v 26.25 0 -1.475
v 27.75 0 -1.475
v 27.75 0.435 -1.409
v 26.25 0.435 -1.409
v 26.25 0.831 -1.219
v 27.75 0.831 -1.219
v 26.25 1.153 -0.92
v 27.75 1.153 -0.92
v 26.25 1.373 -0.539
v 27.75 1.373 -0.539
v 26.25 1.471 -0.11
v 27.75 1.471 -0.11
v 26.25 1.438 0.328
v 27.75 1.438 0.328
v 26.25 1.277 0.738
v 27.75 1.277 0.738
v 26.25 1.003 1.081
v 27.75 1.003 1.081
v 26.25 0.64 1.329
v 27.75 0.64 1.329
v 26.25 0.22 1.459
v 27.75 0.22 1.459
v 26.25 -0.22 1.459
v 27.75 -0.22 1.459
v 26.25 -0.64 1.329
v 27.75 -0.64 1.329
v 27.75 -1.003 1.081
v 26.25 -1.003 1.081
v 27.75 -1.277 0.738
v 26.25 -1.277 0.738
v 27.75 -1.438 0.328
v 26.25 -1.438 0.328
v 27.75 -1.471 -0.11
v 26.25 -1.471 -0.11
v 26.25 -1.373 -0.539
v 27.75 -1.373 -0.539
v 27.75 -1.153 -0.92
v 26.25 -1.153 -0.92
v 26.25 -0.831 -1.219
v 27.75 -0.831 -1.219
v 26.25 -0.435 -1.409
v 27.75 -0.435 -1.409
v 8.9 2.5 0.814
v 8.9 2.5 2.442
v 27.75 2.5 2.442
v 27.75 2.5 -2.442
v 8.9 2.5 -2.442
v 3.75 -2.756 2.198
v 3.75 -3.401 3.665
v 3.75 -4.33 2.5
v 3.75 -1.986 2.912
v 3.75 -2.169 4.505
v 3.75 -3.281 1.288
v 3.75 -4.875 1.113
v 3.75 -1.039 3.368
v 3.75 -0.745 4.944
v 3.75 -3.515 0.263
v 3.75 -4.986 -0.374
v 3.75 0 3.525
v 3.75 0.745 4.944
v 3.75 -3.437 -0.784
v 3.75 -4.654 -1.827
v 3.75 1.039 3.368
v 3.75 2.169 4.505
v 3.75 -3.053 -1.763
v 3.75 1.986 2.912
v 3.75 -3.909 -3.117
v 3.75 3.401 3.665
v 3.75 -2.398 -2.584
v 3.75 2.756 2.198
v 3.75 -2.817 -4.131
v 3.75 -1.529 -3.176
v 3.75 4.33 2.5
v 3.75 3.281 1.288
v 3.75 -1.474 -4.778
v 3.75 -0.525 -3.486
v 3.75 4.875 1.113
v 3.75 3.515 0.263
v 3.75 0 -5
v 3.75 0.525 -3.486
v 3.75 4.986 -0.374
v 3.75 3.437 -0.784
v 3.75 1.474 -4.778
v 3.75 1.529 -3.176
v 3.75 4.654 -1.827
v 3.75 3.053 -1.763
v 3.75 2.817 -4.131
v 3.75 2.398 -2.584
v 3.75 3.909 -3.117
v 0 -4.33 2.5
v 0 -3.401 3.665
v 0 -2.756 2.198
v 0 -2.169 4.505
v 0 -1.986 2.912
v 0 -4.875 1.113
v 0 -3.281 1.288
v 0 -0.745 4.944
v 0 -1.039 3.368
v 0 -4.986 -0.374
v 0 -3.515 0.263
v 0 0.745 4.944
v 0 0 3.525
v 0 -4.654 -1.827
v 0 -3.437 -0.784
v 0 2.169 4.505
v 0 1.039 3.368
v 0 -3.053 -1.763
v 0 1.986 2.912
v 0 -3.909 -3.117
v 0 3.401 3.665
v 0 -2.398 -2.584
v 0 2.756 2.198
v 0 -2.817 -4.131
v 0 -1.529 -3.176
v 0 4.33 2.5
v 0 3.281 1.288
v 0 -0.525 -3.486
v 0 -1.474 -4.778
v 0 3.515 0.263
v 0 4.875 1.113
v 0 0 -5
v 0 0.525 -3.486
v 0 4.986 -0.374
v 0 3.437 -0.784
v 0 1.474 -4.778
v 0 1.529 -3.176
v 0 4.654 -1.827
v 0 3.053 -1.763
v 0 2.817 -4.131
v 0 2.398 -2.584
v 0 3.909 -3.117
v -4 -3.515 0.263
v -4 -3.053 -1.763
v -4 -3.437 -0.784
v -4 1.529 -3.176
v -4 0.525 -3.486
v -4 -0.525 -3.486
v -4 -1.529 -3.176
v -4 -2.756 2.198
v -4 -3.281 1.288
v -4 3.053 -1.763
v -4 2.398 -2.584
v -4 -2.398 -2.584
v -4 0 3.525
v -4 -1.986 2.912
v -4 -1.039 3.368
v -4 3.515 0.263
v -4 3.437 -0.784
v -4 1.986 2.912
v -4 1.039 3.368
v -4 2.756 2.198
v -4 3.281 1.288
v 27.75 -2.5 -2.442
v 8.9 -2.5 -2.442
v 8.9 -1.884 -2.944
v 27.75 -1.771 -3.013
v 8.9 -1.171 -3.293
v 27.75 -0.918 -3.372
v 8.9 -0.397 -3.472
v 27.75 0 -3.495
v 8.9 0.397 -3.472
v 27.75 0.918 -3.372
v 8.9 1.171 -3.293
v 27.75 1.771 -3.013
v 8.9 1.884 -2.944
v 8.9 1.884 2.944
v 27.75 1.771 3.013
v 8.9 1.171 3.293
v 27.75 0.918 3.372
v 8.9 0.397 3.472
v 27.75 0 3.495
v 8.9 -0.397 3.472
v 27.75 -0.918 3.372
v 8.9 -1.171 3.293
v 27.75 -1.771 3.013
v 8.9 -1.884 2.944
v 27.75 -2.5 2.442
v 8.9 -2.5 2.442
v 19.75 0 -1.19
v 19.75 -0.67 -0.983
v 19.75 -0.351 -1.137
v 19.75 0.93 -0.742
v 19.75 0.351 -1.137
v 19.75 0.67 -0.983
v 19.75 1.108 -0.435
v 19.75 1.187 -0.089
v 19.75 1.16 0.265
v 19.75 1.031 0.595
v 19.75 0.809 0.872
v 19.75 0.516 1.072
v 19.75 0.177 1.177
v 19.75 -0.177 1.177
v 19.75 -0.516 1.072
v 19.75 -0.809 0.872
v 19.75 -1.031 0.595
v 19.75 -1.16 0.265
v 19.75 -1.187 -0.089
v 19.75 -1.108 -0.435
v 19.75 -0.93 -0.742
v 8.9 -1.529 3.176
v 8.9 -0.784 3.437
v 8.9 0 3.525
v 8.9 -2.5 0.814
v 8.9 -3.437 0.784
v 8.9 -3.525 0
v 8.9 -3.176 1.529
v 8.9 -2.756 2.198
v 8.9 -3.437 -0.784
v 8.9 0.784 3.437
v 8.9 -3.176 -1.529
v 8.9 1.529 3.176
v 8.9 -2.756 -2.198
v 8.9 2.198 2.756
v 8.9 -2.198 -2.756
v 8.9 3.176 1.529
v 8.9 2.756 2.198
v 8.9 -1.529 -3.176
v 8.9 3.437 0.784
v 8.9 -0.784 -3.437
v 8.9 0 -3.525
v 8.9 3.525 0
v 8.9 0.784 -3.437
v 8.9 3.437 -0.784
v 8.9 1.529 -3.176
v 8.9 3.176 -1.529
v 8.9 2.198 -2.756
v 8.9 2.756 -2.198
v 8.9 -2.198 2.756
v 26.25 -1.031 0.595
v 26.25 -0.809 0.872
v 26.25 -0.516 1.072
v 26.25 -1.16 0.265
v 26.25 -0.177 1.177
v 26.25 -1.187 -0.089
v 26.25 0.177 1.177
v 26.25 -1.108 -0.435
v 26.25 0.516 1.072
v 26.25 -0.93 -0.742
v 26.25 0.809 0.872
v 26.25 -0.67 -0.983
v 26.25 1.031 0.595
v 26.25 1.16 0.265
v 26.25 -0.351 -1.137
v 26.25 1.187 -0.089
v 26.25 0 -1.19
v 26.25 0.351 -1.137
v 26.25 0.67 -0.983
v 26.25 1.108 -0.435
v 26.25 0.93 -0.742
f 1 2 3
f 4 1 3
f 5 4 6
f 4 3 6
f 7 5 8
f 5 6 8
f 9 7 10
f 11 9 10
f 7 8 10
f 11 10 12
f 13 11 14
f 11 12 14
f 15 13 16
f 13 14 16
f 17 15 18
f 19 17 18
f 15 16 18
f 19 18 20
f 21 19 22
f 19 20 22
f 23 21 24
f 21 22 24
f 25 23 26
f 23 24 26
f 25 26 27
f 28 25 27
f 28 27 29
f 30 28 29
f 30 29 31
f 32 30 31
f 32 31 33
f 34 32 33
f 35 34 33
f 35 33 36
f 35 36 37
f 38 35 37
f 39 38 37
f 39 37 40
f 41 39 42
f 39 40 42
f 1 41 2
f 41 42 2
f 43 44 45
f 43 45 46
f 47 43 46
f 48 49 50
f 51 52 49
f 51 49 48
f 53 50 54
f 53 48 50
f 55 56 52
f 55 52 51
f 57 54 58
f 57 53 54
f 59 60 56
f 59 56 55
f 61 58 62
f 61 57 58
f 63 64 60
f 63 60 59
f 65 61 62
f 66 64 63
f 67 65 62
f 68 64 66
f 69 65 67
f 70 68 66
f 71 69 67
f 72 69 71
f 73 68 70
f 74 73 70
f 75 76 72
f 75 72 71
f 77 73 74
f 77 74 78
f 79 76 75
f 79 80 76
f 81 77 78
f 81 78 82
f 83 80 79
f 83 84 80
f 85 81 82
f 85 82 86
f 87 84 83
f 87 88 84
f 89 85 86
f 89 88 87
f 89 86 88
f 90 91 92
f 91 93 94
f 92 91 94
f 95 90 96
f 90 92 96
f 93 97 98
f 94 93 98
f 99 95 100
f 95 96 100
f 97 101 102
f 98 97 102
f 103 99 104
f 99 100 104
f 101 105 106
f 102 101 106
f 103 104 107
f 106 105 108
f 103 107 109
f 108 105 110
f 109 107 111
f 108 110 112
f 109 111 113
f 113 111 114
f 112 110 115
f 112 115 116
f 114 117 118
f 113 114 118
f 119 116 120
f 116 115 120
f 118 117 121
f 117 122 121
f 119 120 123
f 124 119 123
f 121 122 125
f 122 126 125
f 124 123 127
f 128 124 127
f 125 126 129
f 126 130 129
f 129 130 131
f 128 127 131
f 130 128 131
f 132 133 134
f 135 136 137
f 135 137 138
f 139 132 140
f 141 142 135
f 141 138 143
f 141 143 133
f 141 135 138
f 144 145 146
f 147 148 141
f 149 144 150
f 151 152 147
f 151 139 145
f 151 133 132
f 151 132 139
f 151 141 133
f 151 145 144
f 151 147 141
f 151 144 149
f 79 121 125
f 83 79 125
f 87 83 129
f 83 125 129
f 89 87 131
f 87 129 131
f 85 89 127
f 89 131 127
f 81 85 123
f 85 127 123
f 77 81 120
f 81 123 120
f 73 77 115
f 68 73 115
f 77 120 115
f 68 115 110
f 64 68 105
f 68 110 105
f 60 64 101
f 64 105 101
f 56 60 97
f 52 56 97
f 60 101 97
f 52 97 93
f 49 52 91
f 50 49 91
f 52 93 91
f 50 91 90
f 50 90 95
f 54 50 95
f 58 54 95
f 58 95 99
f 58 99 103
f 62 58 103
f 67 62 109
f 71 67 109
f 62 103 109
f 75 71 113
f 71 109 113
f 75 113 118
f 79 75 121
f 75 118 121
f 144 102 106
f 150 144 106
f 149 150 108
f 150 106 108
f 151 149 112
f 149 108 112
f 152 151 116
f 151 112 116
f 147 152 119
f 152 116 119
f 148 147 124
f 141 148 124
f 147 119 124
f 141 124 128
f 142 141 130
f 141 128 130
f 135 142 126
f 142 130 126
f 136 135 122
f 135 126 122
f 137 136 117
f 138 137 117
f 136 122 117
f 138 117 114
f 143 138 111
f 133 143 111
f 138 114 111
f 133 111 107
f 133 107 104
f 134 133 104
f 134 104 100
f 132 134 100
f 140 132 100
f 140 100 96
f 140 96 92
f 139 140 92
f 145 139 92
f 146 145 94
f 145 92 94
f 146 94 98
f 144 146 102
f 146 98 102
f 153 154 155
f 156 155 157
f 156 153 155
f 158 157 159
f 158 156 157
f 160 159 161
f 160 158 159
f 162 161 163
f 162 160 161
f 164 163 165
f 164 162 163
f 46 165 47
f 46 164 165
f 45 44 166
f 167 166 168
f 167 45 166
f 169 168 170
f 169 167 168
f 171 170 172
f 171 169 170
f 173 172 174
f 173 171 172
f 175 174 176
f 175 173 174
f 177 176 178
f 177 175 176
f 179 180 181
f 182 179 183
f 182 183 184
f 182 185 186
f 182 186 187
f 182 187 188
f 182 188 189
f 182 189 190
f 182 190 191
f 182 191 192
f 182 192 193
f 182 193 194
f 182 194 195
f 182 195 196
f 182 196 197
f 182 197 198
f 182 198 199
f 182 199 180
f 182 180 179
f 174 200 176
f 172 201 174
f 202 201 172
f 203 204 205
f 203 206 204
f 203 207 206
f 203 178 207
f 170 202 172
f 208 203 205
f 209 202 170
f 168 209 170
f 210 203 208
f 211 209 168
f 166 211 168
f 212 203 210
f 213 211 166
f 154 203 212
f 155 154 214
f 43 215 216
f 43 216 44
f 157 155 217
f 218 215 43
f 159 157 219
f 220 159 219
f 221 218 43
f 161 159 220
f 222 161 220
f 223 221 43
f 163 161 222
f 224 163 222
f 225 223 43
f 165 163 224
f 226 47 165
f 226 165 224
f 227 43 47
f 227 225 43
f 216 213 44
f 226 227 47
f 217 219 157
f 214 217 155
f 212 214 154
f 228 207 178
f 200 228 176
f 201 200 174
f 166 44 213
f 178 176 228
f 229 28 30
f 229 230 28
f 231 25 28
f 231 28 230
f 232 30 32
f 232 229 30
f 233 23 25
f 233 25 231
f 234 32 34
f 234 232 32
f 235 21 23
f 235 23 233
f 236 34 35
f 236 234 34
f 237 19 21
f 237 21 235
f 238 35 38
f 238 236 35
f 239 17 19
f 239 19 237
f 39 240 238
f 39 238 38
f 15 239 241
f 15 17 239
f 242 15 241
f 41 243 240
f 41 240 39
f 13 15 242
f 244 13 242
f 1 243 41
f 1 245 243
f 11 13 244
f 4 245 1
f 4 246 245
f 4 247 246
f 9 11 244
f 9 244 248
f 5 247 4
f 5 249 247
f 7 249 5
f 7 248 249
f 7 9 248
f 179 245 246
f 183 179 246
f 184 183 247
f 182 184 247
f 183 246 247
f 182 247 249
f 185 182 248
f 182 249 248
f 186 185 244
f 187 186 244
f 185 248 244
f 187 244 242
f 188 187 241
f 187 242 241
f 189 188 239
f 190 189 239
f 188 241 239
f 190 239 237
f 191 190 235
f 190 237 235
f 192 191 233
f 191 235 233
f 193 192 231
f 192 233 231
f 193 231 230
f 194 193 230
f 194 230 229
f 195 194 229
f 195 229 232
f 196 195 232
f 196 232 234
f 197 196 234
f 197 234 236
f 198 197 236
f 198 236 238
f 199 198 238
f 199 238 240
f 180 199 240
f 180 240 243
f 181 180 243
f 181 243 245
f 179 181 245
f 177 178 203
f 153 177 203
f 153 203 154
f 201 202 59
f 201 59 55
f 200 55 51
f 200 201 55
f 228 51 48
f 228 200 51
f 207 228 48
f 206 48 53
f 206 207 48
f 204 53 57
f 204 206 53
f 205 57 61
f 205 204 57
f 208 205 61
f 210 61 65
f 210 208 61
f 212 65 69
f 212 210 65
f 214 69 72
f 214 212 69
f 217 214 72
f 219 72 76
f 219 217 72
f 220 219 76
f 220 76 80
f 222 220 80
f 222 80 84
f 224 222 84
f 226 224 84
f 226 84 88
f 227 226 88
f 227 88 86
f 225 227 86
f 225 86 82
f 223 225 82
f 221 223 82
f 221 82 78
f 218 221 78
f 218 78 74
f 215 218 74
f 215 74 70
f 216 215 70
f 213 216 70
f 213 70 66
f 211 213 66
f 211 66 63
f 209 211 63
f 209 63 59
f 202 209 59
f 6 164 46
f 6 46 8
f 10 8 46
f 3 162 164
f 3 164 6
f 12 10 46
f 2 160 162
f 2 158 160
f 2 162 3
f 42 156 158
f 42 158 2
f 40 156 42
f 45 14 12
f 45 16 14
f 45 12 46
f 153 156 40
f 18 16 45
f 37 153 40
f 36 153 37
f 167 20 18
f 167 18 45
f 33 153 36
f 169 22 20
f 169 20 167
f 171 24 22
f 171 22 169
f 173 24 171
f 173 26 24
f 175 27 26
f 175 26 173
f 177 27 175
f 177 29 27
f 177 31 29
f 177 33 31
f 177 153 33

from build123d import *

# Parameters (mm, degrees)
SKETCH_2_R           = 5
EXTRUDE_1_DEPTH      = 3.75
SKETCH_3_R           = 3.525
EXTRUDE_2_DEPTH      = 4
EXTRUDE_START        = 24
SKETCH_4_R           = 3.525
EXTRUDE_3_DEPTH      = 24
CUT_EXTRUDE_START    = 5.15
SKETCH_5_OUTSIDE_W   = 18.952
SKETCH_5_OUTSIDE_H   = 18.952
SKETCH_5_OUTSIDE_W_2 = 12.787470862
SKETCH_5_OUTSIDE_H_2 = 5
CUT_EXTRUDE_1_DEPTH  = 19.08
SKETCH_6_R           = 1.19
CUT_EXTRUDE_2_DEPTH  = 8
SKETCH_7_R           = 1.475
CUT_EXTRUDE_3_DEPTH  = 1.5
SKETCH_8_OUTSIDE_W   = 18.952
SKETCH_8_OUTSIDE_H   = 18.952
SKETCH_8_OUTSIDE_R   = 3.495
CUT_EXTRUDE_5_DEPTH  = 18.85


with BuildPart() as part:
    # 草图2 → 凸台-拉伸1 (new body)
    with BuildSketch(Plane(origin=(0, 0, 0), x_dir=(0, 0, -1), z_dir=(1, 0, 0))):
        Circle(SKETCH_2_R)
    extrude(amount=EXTRUDE_1_DEPTH)

    # 草图3 → 凸台-拉伸2 (add)
    with BuildSketch(Plane.ZY):
        Circle(SKETCH_3_R)
    extrude(amount=EXTRUDE_2_DEPTH)

    # 草图4 → 凸台-拉伸3 (add)
    with BuildSketch(Plane(origin=(3.75, 0, 0), x_dir=(0, 0, -1), z_dir=(1, 0, 0)).offset(EXTRUDE_START)):
        with Locations(Location((0, 0, 0), (0, 0, 180))):
            Circle(SKETCH_4_R)
    extrude(amount=-EXTRUDE_3_DEPTH)

    # 草图5 outside → 切除-拉伸1 (cut)
    with BuildSketch(Plane(origin=(3.75, 0, 0), x_dir=(0, 0, -1), z_dir=(1, 0, 0)).offset(CUT_EXTRUDE_START)):
        Rectangle(SKETCH_5_OUTSIDE_W, SKETCH_5_OUTSIDE_H)
        Rectangle(SKETCH_5_OUTSIDE_W_2, SKETCH_5_OUTSIDE_H_2, mode=Mode.SUBTRACT)
    extrude(amount=CUT_EXTRUDE_1_DEPTH, mode=Mode.SUBTRACT)

    # 草图6 → 切除-拉伸2 (cut)
    with BuildSketch(Plane(origin=(27.75, 0, 0), x_dir=(0, 0, -1), z_dir=(1, 0, 0))):
        Circle(SKETCH_6_R)
    extrude(amount=-CUT_EXTRUDE_2_DEPTH, mode=Mode.SUBTRACT)

    # 草图7 → 切除-拉伸3 (cut)
    with BuildSketch(Plane(origin=(27.75, 0, 0), x_dir=(0, 0, -1), z_dir=(1, 0, 0))):
        Circle(SKETCH_7_R)
    extrude(amount=-CUT_EXTRUDE_3_DEPTH, mode=Mode.SUBTRACT)

    # 草图8 outside → 切除-拉伸5 (cut)
    with BuildSketch(Plane(origin=(27.75, 0, 0), x_dir=(0, 0, -1), z_dir=(1, 0, 0))):
        Rectangle(SKETCH_8_OUTSIDE_W, SKETCH_8_OUTSIDE_H)
        Circle(SKETCH_8_OUTSIDE_R, mode=Mode.SUBTRACT)
    extrude(amount=-CUT_EXTRUDE_5_DEPTH, mode=Mode.SUBTRACT)


solid = part.part
